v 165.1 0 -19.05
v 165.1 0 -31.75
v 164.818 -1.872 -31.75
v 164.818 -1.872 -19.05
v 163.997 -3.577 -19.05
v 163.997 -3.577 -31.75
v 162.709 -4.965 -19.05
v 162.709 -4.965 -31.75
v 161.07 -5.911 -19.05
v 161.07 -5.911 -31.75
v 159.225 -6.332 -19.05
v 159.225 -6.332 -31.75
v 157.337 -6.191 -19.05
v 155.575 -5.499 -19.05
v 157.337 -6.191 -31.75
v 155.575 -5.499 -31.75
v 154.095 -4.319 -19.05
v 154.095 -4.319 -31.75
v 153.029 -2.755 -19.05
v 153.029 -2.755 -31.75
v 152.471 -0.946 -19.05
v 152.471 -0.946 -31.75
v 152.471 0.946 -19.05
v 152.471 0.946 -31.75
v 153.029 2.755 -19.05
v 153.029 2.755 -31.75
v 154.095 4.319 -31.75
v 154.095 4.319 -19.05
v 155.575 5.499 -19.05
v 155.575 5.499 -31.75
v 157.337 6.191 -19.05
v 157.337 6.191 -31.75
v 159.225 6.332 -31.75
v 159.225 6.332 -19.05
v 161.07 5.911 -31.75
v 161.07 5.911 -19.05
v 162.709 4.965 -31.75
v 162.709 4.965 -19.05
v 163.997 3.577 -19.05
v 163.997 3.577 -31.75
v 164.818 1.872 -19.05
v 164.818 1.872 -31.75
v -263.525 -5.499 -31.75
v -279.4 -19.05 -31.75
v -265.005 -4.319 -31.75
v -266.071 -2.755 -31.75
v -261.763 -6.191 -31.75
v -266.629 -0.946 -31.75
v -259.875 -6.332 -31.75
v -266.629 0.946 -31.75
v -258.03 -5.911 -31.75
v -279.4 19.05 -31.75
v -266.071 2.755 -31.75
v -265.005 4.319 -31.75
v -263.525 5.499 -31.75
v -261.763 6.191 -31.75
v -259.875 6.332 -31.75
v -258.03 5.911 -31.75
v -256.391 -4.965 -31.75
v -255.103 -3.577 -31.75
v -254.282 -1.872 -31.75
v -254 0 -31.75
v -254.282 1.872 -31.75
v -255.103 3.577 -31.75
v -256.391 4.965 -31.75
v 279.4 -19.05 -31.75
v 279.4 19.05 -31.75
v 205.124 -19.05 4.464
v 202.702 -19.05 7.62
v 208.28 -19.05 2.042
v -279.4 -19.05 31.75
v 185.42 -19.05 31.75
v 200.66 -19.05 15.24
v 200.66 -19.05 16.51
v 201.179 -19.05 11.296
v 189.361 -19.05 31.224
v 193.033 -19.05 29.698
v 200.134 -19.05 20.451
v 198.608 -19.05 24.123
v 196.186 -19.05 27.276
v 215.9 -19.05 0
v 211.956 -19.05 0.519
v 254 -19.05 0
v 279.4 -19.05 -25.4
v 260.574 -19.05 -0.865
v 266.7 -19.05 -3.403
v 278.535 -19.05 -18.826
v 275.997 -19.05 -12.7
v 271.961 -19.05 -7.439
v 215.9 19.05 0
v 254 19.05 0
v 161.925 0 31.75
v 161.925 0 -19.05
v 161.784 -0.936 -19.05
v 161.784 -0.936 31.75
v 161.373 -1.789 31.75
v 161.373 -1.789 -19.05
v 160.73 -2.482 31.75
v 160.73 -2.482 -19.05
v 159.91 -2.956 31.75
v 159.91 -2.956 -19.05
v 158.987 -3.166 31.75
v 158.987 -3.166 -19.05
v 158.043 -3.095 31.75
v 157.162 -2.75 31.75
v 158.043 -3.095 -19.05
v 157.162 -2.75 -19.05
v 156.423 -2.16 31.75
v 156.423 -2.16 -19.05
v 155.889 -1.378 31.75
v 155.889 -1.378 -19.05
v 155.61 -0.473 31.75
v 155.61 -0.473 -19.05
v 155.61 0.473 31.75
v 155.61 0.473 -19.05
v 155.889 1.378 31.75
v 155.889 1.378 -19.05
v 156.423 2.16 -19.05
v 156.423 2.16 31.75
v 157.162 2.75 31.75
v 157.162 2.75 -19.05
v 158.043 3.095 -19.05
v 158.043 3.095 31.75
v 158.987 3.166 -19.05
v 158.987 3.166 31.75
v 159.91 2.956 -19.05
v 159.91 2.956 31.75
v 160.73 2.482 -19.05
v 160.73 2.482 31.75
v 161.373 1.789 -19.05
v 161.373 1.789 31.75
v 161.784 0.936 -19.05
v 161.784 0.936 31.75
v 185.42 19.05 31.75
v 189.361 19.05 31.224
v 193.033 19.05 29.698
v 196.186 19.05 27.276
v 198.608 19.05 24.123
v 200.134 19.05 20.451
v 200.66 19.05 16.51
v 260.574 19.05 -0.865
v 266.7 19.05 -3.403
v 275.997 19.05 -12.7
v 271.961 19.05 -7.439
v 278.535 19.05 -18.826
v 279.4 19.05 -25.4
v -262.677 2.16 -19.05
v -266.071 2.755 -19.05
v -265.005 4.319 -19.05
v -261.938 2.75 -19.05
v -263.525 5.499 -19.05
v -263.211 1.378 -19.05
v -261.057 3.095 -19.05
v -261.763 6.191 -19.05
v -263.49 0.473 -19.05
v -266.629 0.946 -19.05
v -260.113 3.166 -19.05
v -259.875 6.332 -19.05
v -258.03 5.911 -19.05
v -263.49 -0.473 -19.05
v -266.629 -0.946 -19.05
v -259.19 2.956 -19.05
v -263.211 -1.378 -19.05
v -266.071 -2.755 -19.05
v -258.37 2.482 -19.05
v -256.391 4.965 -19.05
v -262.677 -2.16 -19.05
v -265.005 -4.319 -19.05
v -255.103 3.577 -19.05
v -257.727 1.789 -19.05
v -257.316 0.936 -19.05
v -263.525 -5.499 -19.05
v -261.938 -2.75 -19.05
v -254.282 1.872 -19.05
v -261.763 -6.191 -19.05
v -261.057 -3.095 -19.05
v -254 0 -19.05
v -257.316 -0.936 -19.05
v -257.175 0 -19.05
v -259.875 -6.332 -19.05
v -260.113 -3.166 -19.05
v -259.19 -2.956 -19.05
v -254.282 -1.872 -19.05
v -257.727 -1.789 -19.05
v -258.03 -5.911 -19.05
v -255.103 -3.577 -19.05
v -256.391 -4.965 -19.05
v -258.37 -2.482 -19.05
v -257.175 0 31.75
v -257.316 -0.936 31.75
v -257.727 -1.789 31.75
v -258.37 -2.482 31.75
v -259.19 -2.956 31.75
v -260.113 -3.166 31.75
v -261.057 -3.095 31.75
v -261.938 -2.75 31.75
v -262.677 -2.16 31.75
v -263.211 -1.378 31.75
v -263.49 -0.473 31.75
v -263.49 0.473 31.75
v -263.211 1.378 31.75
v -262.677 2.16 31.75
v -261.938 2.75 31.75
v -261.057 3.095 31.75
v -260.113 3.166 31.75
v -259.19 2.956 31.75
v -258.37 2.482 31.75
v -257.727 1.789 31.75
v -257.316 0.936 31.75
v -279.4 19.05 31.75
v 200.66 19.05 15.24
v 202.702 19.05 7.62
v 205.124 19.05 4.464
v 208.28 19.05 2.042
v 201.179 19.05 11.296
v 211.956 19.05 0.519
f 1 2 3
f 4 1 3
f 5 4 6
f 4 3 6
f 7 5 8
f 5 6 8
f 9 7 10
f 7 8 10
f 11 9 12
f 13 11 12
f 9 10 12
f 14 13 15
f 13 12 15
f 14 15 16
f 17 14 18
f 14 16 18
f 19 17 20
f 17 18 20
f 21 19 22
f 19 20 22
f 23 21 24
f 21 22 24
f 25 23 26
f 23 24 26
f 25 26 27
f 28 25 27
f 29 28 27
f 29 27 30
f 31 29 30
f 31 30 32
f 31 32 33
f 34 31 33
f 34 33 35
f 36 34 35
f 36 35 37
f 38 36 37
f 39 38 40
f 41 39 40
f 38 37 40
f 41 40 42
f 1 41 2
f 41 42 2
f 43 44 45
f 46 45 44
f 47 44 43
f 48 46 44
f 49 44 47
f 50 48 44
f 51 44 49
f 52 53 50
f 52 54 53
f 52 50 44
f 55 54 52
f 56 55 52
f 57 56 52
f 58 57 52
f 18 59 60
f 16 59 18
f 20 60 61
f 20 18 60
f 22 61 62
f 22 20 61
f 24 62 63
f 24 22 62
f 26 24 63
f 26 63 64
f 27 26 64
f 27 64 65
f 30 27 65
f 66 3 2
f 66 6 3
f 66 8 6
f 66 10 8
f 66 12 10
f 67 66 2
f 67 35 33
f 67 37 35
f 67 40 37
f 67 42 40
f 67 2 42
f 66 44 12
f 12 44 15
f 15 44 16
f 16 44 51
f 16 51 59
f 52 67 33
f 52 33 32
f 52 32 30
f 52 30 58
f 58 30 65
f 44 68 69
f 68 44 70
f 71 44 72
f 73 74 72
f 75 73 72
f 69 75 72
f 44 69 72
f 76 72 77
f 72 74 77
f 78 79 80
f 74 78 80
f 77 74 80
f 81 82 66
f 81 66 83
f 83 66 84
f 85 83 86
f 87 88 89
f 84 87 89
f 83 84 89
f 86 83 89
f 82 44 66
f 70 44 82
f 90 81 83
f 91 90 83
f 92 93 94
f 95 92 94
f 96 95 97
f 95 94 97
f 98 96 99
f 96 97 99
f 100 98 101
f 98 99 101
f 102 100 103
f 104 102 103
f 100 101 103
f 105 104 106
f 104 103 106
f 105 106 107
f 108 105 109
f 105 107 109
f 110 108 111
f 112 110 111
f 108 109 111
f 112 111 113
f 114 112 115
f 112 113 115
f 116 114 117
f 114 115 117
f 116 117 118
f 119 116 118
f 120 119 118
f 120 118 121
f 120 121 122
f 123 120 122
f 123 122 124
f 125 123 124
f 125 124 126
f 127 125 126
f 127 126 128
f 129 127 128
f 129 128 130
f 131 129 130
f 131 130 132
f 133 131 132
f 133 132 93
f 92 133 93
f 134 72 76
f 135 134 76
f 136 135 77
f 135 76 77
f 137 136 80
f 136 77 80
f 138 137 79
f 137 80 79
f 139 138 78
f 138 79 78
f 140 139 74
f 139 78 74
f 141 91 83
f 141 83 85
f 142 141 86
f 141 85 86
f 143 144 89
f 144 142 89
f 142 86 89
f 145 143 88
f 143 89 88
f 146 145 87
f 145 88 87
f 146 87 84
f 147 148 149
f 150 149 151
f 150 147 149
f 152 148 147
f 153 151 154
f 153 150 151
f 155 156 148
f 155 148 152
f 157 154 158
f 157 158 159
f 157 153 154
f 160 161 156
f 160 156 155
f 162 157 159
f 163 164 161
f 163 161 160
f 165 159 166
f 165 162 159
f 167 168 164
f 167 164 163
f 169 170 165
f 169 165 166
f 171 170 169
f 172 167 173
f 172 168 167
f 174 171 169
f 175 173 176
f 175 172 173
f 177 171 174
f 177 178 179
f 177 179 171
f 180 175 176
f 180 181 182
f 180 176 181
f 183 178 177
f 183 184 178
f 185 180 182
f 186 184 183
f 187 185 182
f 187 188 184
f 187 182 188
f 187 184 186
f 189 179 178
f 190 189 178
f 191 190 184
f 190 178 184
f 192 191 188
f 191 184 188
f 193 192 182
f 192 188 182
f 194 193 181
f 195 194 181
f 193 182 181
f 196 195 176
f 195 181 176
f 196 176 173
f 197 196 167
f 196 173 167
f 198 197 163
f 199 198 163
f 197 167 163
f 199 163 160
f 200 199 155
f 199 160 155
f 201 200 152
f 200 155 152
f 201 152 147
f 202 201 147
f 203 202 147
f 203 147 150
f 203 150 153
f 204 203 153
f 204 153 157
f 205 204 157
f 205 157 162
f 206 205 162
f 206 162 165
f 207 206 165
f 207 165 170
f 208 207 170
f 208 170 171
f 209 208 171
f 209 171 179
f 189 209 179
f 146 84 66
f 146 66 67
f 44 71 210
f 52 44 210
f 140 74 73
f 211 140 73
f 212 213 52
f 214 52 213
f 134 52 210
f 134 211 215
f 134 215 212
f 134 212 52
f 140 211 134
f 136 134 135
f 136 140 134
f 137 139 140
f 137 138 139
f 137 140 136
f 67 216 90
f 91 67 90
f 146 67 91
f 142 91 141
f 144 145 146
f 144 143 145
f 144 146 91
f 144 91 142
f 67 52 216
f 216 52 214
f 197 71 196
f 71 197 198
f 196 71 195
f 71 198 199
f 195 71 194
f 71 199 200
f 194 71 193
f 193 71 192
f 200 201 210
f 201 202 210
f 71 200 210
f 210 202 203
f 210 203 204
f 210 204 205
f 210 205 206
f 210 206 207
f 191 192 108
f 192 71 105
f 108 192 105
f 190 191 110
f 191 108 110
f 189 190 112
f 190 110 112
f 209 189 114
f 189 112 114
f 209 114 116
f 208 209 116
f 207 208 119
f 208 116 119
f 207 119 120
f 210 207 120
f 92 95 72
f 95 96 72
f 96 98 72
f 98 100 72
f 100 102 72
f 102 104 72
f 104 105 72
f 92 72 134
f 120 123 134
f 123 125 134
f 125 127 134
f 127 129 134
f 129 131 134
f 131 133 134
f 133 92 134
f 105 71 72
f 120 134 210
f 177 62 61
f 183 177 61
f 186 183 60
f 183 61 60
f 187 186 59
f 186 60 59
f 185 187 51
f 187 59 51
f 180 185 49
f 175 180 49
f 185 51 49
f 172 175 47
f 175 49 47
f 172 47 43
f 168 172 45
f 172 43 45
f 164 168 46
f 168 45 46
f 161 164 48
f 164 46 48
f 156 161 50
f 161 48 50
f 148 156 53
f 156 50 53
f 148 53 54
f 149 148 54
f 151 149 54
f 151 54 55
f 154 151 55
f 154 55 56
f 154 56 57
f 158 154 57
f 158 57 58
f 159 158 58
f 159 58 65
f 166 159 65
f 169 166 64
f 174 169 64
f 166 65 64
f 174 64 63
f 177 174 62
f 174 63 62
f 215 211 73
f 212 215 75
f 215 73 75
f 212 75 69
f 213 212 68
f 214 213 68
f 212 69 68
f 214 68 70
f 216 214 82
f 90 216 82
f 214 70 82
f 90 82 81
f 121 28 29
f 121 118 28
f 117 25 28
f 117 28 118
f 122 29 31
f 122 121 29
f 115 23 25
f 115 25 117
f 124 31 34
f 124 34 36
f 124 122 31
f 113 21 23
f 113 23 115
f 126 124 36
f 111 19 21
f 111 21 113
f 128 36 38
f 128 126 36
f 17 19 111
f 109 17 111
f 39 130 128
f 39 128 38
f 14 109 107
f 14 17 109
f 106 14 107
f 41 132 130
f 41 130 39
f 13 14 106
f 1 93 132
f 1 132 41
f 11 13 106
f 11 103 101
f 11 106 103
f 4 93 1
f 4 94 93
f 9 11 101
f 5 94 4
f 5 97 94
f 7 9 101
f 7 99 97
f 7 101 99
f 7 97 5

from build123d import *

# Parameters (mm, degrees)
F0_W     = 38.1
F0_H     = 63.5
F1_DEPTH = 279.4
F3_DEPTH = 38.101
F4_R     = 6.35
F5_DEPTH = 12.7
F6_R     = 3.175
F7_DEPTH = 50.801


with BuildPart() as f1:
    # F0 (on Right) → F1 (new body, symmetric)
    with BuildSketch(Plane.YZ):
        Rectangle(F0_W, F0_H)
    extrude(amount=F1_DEPTH, both=True)

    # F2 (on face) → F3 (cut, through all)
    with BuildSketch(Plane.XZ.offset(19.05)):
        with BuildLine():
            ThreePointArc((254, 0), (271.960512, -7.439488), (279.4, -25.4))
            Line((279.4, -25.4), (279.4, 31.75))
            Line((279.4, 31.75), (185.42, 31.75))
            ThreePointArc((185.42, 31.75), (196.186422, 27.276422), (200.66, 16.51))
            Line((200.66, 16.51), (200.66, 15.24))
            ThreePointArc((200.66, 15.24), (205.123693, 4.463693), (215.9, 0))
            Line((215.9, 0), (254, 0))
        make_face()
    extrude(amount=-F3_DEPTH, mode=Mode.SUBTRACT)

    # F4 (on face) → F5 (cut)
    with BuildSketch(Plane(origin=(0, 0, -31.75), x_dir=(1, 0, 0), z_dir=(0, 0, -1))):
        with Locations((-260.35, 0)):
            Circle(F4_R)
        with Locations((158.75, 0)):
            Circle(F4_R)
    extrude(amount=-F5_DEPTH, mode=Mode.SUBTRACT)

    # F6 (on face) → F7 (cut, through all)
    with BuildSketch(Plane(origin=(0, 0, -19.05), x_dir=(1, 0, 0), z_dir=(0, 0, -1))):
        with Locations((-260.35, 0)):
            Circle(F6_R)
        with Locations((158.75, 0)):
            Circle(F6_R)
    extrude(amount=-F7_DEPTH, mode=Mode.SUBTRACT)


solid = f1.part
